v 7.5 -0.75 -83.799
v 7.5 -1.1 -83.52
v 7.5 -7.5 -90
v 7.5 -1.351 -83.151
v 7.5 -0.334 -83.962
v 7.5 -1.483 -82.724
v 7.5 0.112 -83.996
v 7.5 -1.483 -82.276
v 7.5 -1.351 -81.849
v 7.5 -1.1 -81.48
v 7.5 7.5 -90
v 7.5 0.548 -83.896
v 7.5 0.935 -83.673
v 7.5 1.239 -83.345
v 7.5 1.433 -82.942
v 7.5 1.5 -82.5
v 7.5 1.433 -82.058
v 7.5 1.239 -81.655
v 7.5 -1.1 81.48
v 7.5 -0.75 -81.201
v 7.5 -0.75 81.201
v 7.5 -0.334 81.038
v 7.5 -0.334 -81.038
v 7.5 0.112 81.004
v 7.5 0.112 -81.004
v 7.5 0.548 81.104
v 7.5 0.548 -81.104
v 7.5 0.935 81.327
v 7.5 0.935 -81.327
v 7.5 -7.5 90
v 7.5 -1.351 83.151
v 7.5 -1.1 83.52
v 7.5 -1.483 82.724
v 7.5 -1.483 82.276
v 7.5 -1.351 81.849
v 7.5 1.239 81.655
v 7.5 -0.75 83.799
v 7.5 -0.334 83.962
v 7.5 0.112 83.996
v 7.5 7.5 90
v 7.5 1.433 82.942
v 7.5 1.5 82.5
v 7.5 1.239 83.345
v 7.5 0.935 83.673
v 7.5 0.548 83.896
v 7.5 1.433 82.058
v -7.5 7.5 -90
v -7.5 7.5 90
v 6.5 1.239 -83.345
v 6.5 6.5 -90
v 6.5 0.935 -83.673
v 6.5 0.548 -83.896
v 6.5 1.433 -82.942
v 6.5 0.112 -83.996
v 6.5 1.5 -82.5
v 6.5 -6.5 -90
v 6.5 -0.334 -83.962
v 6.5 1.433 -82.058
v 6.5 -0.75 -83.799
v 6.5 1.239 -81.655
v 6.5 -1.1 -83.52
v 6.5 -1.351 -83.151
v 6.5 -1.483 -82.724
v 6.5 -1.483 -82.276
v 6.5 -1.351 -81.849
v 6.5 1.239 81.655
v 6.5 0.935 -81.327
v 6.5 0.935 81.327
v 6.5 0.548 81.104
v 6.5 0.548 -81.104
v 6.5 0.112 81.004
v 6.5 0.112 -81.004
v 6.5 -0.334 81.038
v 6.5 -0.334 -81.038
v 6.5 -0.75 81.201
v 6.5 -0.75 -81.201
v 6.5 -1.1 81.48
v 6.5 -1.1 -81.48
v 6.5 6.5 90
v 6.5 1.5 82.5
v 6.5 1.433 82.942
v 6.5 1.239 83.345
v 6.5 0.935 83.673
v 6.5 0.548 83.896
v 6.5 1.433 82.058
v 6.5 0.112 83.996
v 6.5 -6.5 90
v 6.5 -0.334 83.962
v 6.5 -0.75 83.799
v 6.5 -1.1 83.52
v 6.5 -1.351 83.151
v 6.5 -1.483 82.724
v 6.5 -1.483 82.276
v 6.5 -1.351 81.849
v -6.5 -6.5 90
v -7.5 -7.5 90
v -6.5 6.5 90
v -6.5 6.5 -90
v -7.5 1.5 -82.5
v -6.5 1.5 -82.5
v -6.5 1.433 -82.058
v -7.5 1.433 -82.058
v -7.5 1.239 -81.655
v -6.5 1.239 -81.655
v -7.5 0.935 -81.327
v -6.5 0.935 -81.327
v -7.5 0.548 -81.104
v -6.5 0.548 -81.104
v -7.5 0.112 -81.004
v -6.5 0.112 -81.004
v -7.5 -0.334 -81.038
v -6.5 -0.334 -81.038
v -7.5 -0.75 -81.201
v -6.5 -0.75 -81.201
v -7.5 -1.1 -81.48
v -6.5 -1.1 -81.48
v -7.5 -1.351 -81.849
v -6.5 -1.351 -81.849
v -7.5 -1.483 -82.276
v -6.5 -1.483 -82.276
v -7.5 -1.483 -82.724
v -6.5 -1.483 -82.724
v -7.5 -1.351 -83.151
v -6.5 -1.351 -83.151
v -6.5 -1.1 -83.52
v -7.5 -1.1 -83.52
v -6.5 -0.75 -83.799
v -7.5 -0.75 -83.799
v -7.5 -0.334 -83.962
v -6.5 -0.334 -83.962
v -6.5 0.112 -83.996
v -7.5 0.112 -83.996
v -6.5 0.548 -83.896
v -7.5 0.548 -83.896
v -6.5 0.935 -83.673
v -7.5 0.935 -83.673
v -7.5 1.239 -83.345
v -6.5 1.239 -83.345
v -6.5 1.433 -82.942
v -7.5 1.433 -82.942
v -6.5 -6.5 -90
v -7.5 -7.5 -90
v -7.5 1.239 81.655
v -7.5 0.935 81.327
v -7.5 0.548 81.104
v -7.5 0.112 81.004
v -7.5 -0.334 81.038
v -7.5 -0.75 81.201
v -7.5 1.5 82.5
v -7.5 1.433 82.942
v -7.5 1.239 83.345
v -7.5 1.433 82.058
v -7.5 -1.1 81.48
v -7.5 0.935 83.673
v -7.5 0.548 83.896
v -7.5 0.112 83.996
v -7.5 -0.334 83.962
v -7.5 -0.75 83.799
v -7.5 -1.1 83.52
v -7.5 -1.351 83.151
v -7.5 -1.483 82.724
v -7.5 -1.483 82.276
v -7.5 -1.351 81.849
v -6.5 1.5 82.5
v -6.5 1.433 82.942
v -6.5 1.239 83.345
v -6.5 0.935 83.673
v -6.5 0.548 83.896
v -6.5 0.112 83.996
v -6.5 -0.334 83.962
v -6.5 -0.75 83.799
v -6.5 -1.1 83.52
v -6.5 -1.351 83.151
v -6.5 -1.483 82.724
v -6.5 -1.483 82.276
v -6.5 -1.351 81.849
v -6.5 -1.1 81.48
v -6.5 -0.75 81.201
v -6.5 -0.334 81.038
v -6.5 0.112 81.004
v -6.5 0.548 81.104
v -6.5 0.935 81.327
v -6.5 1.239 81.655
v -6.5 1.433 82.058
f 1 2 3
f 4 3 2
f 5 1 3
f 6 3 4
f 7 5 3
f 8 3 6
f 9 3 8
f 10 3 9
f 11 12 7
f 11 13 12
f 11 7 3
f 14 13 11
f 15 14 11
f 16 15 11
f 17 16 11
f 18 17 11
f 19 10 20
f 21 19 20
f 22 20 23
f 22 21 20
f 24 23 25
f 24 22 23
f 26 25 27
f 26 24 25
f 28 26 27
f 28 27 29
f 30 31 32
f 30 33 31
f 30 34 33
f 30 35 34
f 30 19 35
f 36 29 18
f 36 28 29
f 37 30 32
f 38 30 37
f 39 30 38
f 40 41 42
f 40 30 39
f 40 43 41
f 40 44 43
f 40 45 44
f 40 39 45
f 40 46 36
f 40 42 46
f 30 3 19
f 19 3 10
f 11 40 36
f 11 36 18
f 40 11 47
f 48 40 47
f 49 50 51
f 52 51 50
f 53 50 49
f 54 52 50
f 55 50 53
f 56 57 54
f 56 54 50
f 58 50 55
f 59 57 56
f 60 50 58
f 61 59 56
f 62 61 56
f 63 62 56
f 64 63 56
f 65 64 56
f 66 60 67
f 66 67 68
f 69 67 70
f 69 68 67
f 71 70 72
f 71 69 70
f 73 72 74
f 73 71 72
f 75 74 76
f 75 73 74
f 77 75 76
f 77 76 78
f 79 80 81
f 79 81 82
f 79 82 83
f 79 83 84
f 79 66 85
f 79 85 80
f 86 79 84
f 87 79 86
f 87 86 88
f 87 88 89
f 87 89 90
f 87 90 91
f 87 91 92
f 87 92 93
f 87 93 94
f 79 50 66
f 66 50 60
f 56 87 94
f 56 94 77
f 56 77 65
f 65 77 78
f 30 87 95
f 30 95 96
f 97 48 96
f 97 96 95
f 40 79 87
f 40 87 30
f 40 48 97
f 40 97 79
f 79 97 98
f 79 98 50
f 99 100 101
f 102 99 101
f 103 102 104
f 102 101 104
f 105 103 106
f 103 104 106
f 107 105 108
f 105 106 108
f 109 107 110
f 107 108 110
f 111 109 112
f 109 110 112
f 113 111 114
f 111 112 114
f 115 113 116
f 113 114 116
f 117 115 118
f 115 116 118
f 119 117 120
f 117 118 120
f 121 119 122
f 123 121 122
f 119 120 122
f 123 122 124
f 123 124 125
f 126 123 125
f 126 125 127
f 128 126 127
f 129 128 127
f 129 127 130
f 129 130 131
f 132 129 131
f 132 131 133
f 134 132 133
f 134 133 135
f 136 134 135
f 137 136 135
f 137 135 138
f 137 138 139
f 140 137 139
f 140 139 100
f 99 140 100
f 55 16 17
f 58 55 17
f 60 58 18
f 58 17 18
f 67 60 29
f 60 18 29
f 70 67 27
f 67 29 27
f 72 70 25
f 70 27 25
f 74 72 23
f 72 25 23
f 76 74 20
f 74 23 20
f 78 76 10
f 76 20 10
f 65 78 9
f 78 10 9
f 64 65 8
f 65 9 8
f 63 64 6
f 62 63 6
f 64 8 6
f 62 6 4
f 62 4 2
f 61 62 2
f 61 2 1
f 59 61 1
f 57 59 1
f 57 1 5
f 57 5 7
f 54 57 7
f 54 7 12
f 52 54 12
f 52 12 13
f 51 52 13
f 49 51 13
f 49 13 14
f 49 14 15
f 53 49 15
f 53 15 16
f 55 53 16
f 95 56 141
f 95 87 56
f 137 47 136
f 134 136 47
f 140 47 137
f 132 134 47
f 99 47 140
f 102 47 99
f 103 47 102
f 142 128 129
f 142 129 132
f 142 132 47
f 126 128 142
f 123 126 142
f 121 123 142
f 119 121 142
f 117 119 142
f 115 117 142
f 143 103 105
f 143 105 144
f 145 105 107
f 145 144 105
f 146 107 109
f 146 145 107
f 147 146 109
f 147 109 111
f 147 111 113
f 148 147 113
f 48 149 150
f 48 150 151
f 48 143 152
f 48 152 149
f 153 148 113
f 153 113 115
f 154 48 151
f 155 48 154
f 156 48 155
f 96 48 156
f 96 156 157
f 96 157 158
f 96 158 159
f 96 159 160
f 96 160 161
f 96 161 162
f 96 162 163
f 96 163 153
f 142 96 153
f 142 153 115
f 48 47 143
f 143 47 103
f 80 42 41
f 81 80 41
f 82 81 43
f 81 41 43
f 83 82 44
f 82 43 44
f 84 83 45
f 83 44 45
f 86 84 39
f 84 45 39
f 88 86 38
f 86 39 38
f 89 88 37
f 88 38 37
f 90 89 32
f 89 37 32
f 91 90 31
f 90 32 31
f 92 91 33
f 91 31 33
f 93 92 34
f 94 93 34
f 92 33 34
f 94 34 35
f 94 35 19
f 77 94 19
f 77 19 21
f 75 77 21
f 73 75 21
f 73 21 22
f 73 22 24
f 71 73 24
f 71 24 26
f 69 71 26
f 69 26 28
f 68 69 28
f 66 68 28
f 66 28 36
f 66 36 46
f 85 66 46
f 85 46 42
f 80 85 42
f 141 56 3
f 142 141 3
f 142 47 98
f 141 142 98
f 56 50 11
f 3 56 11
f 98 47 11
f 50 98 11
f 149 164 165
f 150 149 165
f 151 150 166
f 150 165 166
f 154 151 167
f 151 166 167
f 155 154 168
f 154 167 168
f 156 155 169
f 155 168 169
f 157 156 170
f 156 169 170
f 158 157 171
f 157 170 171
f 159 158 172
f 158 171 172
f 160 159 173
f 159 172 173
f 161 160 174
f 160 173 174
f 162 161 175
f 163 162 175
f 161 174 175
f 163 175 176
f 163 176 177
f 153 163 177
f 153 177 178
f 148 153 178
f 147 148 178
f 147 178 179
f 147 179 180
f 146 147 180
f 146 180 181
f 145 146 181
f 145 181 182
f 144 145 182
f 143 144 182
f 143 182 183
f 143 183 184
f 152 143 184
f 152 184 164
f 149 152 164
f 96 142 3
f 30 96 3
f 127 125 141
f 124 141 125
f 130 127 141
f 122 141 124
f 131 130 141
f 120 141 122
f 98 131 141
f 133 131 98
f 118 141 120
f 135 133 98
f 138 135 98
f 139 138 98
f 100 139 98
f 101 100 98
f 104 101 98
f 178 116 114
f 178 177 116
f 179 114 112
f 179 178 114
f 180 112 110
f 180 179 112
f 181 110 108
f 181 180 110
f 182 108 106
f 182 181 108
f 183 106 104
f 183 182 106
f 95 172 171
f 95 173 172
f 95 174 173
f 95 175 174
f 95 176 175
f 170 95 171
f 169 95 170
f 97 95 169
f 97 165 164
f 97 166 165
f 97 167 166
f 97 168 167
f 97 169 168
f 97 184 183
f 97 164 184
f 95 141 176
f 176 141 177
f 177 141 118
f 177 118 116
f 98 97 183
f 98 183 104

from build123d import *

# Parameters (mm, degrees)
F1_DEPTH = 90
F3_D     = 3


with BuildPart() as f1:
    # F0 (on Top) → F1 (new body, symmetric)
    with BuildSketch(Plane.XY):
        Polygon((-6.5, 6.5), (-7.5, 7.5), (-7.5, -7.5), (7.5, -7.5), (6.5, -6.5), (-6.5, -6.5), align=None)
        Polygon((7.5, 7.5), (-7.5, 7.5), (-6.5, 6.5), (6.5, 6.5), (6.5, -6.5), (7.5, -7.5), align=None)
    extrude(amount=F1_DEPTH, both=True)

    # F3 (through all)
    with Locations(Plane(origin=(-7.5, 0, 0), x_dir=(0, -1, 0), z_dir=(-1, 0, 0))):
        with Locations((0, 82.5), (0, -82.5)):
            Hole(F3_D / 2)


solid = f1.part
